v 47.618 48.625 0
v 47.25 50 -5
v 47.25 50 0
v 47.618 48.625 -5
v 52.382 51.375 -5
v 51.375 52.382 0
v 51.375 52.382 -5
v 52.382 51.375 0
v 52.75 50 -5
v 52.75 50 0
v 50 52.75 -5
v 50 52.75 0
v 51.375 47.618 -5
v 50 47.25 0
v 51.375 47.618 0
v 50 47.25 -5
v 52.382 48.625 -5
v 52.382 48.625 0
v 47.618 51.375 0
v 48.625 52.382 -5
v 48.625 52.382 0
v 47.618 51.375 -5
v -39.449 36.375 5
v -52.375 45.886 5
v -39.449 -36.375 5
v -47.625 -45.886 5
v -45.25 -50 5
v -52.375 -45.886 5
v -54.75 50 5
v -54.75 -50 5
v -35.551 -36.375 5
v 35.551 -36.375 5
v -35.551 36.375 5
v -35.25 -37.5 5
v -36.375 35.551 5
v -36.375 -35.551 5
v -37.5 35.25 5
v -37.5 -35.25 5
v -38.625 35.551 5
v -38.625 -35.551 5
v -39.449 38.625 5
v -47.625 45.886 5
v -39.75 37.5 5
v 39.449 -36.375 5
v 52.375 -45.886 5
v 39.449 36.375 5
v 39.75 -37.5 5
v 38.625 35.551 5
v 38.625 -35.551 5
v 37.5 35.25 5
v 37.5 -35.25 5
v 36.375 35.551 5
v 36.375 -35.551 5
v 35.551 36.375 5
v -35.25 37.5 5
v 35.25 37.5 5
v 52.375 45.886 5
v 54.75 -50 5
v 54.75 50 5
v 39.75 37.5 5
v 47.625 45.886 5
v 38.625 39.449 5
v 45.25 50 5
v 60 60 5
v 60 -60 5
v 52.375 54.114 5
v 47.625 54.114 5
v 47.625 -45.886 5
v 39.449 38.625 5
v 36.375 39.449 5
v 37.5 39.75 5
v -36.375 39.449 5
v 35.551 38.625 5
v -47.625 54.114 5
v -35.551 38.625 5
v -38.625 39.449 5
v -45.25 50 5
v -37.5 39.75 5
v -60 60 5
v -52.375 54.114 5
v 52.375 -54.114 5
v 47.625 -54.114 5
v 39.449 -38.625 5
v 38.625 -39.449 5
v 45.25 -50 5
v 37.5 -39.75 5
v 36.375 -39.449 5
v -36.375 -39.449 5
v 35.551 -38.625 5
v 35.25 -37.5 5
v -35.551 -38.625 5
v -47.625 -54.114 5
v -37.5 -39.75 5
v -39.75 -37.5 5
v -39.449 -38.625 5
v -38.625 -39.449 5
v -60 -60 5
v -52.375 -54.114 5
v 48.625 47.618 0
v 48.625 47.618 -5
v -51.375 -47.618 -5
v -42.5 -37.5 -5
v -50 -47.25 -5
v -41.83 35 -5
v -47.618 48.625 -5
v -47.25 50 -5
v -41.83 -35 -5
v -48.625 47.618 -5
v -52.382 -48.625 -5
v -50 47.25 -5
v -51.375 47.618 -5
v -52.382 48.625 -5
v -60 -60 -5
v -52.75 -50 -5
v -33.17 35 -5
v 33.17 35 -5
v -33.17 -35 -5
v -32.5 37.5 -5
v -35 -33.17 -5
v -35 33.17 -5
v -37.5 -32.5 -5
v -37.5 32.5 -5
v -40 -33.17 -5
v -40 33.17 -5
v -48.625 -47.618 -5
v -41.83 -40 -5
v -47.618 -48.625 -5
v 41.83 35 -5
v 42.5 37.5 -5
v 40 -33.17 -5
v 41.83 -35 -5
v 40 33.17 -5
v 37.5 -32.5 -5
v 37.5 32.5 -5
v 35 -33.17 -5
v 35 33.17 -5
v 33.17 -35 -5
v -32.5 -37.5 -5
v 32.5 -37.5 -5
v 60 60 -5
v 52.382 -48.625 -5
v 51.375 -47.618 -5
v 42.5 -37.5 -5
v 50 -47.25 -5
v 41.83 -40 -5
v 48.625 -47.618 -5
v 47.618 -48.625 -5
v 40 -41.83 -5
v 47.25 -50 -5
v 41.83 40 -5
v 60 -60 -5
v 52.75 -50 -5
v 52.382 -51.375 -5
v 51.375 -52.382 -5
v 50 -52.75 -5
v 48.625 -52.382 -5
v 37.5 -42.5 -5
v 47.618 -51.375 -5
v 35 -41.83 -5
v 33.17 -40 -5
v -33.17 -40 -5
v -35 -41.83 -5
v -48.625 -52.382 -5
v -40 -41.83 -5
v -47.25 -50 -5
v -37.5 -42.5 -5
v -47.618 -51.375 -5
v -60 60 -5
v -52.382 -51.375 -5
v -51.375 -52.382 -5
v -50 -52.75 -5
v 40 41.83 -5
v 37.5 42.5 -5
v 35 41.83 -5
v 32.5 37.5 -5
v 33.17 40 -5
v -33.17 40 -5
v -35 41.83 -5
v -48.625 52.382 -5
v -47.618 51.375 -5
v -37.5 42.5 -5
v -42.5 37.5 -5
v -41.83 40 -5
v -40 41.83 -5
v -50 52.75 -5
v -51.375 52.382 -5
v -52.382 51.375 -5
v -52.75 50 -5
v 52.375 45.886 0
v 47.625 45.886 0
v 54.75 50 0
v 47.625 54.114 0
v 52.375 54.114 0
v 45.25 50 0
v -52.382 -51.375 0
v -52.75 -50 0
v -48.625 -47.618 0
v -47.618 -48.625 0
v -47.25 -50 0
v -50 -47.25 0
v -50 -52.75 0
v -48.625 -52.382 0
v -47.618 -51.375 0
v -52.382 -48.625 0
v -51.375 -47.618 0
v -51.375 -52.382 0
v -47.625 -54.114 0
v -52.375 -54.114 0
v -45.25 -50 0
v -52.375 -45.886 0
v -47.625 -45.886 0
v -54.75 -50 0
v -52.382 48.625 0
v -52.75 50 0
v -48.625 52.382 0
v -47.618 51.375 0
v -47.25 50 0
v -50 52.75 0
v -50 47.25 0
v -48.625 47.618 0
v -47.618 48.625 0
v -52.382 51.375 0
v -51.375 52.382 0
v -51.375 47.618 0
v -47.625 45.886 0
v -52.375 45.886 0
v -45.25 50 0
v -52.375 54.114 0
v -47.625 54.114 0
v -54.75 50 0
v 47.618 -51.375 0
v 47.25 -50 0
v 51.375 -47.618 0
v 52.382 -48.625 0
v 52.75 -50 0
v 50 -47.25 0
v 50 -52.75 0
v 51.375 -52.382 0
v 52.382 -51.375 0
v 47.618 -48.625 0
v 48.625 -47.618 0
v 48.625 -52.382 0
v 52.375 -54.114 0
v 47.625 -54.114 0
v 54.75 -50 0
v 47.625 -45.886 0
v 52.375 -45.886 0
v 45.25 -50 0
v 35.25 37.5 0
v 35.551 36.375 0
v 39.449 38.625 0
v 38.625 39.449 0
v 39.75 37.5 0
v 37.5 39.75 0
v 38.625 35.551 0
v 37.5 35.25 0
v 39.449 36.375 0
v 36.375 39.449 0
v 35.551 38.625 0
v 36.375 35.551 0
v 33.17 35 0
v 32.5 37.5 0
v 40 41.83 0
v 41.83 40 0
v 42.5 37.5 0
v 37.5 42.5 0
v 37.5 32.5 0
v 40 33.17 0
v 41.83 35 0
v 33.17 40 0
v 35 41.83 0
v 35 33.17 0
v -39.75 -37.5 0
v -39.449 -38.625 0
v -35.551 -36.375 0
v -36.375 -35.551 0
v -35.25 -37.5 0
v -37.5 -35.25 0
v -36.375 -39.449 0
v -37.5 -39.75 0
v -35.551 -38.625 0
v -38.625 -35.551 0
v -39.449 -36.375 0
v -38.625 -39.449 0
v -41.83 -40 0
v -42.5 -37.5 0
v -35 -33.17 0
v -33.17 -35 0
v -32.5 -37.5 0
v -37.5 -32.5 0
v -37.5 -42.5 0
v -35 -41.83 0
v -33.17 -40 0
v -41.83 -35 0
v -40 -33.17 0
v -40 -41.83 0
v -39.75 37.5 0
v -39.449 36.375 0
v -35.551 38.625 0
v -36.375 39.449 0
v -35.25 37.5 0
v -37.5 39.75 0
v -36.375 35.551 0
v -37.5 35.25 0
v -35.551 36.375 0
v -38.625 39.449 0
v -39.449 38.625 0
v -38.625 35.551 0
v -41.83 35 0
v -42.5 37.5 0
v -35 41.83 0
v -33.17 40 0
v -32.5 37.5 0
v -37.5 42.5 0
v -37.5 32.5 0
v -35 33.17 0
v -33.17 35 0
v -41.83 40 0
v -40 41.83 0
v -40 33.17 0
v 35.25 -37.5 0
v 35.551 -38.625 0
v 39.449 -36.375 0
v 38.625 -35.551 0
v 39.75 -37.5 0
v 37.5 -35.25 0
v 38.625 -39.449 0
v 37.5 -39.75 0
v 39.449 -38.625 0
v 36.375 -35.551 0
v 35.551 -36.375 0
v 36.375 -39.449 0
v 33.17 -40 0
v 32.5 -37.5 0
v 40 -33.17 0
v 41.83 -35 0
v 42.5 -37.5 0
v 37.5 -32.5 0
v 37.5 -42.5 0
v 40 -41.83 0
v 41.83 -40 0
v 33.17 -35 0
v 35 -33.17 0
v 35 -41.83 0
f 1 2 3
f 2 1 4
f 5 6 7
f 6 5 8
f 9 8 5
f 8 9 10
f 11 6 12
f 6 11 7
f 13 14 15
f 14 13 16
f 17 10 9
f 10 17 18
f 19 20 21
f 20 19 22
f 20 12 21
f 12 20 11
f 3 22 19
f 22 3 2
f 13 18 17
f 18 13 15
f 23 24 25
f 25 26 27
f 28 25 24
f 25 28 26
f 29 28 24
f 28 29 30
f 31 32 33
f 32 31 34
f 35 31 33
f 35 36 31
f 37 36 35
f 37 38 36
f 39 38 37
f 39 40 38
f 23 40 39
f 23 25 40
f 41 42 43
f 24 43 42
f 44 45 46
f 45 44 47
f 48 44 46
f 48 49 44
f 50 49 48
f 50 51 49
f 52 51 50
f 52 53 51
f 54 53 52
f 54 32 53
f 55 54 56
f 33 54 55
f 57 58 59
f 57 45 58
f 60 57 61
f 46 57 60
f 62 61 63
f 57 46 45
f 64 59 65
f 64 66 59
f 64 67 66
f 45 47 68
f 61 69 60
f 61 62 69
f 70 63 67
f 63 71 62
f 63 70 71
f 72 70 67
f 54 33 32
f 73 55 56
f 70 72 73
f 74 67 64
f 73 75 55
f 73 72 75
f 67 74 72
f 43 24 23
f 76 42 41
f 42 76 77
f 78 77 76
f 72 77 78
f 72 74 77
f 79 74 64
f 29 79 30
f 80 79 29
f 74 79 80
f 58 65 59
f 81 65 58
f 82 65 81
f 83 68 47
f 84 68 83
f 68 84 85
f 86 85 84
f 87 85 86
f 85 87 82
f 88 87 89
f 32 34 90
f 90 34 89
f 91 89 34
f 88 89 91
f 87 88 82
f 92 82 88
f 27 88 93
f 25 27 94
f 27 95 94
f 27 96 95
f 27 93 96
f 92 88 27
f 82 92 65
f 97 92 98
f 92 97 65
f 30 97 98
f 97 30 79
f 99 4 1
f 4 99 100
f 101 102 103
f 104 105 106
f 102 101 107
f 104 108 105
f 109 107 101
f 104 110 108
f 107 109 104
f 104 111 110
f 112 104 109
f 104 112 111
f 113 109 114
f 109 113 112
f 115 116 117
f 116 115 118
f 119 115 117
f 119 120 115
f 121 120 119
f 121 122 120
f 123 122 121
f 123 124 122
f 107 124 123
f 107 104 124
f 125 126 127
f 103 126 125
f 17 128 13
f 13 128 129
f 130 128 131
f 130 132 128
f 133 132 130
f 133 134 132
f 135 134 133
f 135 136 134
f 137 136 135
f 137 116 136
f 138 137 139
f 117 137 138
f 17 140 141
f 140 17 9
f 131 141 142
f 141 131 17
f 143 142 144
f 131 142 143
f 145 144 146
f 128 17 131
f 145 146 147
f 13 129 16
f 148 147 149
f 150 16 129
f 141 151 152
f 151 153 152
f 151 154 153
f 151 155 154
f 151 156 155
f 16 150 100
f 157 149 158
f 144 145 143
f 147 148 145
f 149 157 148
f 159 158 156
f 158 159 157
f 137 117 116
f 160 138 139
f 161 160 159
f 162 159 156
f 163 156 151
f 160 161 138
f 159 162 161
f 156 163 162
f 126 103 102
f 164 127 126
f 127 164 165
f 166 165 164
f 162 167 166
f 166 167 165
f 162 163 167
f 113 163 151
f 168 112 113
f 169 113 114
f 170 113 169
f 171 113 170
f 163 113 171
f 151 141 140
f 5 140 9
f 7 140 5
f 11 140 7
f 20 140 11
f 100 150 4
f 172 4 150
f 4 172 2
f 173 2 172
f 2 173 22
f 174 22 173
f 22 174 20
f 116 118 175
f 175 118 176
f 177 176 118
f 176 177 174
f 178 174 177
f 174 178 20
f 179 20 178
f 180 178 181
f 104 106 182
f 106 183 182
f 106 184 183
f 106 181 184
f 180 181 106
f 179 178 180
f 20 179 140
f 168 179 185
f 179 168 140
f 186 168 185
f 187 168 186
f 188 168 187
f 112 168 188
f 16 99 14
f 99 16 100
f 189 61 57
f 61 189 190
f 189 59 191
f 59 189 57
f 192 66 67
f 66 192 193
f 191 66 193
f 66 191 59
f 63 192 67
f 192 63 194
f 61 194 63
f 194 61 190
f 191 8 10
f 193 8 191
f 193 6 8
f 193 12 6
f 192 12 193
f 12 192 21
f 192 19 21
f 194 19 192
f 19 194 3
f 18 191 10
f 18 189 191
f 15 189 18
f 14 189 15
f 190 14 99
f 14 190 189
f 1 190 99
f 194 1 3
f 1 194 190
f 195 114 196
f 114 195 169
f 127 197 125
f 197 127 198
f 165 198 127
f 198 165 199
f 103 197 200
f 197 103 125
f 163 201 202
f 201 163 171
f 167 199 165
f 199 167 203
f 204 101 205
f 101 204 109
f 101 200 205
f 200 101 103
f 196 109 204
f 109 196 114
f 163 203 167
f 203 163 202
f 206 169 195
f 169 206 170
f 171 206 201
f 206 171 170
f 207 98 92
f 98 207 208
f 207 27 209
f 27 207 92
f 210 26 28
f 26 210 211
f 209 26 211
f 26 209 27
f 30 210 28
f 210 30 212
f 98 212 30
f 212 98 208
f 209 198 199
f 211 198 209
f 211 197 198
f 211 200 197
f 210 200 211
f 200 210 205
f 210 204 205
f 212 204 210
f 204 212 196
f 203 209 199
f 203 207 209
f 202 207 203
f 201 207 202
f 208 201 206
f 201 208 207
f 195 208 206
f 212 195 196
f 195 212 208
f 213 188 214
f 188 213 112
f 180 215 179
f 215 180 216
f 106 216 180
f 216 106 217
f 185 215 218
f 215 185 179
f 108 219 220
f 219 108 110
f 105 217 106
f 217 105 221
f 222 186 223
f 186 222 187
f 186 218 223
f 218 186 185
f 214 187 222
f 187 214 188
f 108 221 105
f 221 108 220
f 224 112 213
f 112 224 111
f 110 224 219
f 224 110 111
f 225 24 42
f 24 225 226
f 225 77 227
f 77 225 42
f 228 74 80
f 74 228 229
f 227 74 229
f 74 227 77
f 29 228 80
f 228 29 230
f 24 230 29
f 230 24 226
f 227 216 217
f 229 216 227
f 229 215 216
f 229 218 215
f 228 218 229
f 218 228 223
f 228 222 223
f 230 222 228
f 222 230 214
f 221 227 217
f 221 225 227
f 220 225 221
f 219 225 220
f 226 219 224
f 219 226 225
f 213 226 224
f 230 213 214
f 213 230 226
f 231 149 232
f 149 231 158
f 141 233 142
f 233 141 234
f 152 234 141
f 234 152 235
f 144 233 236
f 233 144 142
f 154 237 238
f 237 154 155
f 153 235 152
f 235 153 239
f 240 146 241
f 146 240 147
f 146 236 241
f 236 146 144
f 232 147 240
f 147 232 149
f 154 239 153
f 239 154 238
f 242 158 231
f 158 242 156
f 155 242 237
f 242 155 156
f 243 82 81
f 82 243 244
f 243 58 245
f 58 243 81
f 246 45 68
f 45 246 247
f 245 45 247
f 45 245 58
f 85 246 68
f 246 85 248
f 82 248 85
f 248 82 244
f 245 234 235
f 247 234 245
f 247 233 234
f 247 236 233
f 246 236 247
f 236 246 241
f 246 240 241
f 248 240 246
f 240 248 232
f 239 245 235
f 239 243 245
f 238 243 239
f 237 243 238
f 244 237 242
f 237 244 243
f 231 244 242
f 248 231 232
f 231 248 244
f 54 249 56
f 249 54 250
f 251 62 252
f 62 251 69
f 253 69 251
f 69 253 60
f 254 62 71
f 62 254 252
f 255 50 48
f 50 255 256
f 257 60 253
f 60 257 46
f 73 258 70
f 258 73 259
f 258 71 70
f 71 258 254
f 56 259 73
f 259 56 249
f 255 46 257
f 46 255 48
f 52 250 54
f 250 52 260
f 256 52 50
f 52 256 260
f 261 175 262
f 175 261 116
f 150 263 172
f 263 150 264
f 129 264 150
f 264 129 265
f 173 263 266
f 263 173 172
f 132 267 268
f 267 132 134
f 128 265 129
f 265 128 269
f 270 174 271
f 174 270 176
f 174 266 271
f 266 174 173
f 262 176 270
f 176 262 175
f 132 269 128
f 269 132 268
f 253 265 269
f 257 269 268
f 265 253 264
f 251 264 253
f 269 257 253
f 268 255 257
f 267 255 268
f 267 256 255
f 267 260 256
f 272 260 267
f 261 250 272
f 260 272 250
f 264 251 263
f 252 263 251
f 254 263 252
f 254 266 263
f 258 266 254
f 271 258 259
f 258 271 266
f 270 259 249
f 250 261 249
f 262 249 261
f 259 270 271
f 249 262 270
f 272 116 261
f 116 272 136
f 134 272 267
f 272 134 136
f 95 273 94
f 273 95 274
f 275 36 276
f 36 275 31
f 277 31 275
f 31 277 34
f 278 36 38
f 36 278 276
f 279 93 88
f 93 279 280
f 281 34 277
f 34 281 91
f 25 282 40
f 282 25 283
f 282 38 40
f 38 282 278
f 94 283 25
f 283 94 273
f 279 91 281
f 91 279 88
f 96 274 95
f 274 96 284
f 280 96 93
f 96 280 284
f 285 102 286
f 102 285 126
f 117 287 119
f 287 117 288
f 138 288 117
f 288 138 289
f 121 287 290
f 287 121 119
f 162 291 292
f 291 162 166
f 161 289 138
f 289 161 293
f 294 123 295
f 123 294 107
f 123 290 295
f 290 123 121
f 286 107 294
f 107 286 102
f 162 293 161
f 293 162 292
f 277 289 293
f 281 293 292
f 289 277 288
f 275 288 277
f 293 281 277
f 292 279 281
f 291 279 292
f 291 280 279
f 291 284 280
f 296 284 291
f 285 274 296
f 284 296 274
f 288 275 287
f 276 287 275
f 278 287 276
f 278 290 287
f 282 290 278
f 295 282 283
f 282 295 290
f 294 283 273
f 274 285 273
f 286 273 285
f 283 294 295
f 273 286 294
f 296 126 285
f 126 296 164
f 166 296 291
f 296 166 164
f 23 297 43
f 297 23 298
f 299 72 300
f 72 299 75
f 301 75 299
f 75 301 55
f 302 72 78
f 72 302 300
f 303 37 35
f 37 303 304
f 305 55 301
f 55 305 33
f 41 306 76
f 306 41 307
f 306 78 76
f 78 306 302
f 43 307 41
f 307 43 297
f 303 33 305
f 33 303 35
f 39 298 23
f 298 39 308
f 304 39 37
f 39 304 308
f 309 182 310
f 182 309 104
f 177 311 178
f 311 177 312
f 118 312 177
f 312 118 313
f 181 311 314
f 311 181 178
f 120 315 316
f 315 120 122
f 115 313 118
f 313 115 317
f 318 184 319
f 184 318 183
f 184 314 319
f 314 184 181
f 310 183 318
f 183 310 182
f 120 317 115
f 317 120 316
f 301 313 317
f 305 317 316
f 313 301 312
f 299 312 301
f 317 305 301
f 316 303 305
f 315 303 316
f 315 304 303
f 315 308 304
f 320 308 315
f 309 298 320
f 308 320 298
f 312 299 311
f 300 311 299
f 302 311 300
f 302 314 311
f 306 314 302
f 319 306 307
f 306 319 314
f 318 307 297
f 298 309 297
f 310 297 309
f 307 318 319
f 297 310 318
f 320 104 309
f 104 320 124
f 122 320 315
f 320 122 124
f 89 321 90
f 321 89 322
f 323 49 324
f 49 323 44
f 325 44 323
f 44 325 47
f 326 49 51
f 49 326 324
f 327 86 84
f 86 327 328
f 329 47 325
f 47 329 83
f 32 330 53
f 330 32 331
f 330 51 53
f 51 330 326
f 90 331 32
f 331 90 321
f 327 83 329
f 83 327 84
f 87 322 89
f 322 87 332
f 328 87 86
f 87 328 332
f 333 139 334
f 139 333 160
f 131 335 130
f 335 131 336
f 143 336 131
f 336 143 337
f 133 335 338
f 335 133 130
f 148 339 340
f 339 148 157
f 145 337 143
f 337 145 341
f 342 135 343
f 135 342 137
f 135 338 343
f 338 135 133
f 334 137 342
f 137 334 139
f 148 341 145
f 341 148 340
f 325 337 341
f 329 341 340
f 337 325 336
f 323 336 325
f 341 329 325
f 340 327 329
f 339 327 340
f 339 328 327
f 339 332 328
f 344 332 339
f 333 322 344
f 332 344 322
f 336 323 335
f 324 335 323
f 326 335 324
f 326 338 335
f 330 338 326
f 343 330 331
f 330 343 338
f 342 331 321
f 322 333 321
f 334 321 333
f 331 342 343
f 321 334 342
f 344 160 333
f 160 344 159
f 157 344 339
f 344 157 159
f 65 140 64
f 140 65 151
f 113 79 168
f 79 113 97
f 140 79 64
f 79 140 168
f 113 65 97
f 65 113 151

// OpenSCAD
// Vesa 100mm to 75mm adapter


plate_edge = 120;
plate_height = 10;
vesa_a = 100;
vesa_b = 75;

hole_a = 5.5;
hole_b = 4.5;

nut_h = 5;
nut_d = 9.5;

head_d = 10;
head_h = 5;



module plate() {
    cube([120,120,10], center=true);
}

module vesa_hole_a() {
    cylinder(d=hole_a, h=plate_height, center=true, $fn=12);
    translate([0, 0, 0.5*(plate_height-nut_h)]) cylinder(d=nut_d, h=nut_h, center=true, $fn=6);
}

module vesa_hole_b() {
    cylinder(d=hole_b, h=plate_height, center=true, $fn=12);
    translate([0, 0, -0.5*(plate_height-head_h)]) cylinder(d=head_d, h=head_h, center=true, $fn=12); 
}
module vesa_a_holes() {
  off = 0.5 * vesa_a;
  translate([off, off, 0]) vesa_hole_a();
  translate([-off, -off, 0]) vesa_hole_a();
  translate([-off, off, 0]) vesa_hole_a();
  translate([off, -off, 0]) vesa_hole_a();
}
module vesa_b_holes() {
  off = 0.5 * vesa_b;
  translate([off, off, 0]) vesa_hole_b();
  translate([-off, -off, 0]) vesa_hole_b();
  translate([-off, off, 0]) vesa_hole_b();
  translate([off, -off, 0]) vesa_hole_b();
}

difference() 
{
  plate();
  vesa_a_holes();
  vesa_b_holes();
}
